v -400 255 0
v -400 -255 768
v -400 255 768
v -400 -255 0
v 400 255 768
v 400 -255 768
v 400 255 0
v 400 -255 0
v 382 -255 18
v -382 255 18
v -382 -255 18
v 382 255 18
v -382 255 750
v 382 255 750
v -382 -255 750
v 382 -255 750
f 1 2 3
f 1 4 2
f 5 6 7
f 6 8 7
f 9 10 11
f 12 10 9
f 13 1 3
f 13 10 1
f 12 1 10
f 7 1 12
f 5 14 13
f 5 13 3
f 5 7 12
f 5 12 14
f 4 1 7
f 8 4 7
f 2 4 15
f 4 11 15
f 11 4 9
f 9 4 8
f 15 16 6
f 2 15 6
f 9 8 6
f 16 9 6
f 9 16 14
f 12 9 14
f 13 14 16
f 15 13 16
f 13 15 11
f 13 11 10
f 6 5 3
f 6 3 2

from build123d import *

# Parameters (mm, degrees)
F0_W     = 800
F0_H     = 510
F1_DEPTH = 18
F2_W     = 18
F2_H     = 510
F3_DEPTH = 750
F4_W     = 18
F4_H     = 510
F5_DEPTH = 750
F6_W     = 510
F6_H     = 18
F7_DEPTH = 764


with BuildPart() as f1:
    # F0 (on Top) → F1 (new body)
    with BuildSketch(Plane.XY):
        Rectangle(F0_W, F0_H)
    extrude(amount=F1_DEPTH)

    # F2 (on face) → F3 (join)
    with BuildSketch(Plane.XY.offset(18)):
        with Locations((-391, 0)):
            Rectangle(F2_W, F2_H)
    extrude(amount=F3_DEPTH)

    # F4 (on face) → F5 (join)
    with BuildSketch(Plane.XY.offset(18)):
        with Locations((391, 0)):
            Rectangle(F4_W, F4_H)
    extrude(amount=F5_DEPTH)

    # F6 (on face) → F7 (join)
    with BuildSketch(Plane(origin=(382, 0, 0), x_dir=(0, -1, 0), z_dir=(-1, 0, 0))):
        with Locations((0, 759)):
            Rectangle(F6_W, F6_H)
    extrude(amount=F7_DEPTH)


solid = f1.part
